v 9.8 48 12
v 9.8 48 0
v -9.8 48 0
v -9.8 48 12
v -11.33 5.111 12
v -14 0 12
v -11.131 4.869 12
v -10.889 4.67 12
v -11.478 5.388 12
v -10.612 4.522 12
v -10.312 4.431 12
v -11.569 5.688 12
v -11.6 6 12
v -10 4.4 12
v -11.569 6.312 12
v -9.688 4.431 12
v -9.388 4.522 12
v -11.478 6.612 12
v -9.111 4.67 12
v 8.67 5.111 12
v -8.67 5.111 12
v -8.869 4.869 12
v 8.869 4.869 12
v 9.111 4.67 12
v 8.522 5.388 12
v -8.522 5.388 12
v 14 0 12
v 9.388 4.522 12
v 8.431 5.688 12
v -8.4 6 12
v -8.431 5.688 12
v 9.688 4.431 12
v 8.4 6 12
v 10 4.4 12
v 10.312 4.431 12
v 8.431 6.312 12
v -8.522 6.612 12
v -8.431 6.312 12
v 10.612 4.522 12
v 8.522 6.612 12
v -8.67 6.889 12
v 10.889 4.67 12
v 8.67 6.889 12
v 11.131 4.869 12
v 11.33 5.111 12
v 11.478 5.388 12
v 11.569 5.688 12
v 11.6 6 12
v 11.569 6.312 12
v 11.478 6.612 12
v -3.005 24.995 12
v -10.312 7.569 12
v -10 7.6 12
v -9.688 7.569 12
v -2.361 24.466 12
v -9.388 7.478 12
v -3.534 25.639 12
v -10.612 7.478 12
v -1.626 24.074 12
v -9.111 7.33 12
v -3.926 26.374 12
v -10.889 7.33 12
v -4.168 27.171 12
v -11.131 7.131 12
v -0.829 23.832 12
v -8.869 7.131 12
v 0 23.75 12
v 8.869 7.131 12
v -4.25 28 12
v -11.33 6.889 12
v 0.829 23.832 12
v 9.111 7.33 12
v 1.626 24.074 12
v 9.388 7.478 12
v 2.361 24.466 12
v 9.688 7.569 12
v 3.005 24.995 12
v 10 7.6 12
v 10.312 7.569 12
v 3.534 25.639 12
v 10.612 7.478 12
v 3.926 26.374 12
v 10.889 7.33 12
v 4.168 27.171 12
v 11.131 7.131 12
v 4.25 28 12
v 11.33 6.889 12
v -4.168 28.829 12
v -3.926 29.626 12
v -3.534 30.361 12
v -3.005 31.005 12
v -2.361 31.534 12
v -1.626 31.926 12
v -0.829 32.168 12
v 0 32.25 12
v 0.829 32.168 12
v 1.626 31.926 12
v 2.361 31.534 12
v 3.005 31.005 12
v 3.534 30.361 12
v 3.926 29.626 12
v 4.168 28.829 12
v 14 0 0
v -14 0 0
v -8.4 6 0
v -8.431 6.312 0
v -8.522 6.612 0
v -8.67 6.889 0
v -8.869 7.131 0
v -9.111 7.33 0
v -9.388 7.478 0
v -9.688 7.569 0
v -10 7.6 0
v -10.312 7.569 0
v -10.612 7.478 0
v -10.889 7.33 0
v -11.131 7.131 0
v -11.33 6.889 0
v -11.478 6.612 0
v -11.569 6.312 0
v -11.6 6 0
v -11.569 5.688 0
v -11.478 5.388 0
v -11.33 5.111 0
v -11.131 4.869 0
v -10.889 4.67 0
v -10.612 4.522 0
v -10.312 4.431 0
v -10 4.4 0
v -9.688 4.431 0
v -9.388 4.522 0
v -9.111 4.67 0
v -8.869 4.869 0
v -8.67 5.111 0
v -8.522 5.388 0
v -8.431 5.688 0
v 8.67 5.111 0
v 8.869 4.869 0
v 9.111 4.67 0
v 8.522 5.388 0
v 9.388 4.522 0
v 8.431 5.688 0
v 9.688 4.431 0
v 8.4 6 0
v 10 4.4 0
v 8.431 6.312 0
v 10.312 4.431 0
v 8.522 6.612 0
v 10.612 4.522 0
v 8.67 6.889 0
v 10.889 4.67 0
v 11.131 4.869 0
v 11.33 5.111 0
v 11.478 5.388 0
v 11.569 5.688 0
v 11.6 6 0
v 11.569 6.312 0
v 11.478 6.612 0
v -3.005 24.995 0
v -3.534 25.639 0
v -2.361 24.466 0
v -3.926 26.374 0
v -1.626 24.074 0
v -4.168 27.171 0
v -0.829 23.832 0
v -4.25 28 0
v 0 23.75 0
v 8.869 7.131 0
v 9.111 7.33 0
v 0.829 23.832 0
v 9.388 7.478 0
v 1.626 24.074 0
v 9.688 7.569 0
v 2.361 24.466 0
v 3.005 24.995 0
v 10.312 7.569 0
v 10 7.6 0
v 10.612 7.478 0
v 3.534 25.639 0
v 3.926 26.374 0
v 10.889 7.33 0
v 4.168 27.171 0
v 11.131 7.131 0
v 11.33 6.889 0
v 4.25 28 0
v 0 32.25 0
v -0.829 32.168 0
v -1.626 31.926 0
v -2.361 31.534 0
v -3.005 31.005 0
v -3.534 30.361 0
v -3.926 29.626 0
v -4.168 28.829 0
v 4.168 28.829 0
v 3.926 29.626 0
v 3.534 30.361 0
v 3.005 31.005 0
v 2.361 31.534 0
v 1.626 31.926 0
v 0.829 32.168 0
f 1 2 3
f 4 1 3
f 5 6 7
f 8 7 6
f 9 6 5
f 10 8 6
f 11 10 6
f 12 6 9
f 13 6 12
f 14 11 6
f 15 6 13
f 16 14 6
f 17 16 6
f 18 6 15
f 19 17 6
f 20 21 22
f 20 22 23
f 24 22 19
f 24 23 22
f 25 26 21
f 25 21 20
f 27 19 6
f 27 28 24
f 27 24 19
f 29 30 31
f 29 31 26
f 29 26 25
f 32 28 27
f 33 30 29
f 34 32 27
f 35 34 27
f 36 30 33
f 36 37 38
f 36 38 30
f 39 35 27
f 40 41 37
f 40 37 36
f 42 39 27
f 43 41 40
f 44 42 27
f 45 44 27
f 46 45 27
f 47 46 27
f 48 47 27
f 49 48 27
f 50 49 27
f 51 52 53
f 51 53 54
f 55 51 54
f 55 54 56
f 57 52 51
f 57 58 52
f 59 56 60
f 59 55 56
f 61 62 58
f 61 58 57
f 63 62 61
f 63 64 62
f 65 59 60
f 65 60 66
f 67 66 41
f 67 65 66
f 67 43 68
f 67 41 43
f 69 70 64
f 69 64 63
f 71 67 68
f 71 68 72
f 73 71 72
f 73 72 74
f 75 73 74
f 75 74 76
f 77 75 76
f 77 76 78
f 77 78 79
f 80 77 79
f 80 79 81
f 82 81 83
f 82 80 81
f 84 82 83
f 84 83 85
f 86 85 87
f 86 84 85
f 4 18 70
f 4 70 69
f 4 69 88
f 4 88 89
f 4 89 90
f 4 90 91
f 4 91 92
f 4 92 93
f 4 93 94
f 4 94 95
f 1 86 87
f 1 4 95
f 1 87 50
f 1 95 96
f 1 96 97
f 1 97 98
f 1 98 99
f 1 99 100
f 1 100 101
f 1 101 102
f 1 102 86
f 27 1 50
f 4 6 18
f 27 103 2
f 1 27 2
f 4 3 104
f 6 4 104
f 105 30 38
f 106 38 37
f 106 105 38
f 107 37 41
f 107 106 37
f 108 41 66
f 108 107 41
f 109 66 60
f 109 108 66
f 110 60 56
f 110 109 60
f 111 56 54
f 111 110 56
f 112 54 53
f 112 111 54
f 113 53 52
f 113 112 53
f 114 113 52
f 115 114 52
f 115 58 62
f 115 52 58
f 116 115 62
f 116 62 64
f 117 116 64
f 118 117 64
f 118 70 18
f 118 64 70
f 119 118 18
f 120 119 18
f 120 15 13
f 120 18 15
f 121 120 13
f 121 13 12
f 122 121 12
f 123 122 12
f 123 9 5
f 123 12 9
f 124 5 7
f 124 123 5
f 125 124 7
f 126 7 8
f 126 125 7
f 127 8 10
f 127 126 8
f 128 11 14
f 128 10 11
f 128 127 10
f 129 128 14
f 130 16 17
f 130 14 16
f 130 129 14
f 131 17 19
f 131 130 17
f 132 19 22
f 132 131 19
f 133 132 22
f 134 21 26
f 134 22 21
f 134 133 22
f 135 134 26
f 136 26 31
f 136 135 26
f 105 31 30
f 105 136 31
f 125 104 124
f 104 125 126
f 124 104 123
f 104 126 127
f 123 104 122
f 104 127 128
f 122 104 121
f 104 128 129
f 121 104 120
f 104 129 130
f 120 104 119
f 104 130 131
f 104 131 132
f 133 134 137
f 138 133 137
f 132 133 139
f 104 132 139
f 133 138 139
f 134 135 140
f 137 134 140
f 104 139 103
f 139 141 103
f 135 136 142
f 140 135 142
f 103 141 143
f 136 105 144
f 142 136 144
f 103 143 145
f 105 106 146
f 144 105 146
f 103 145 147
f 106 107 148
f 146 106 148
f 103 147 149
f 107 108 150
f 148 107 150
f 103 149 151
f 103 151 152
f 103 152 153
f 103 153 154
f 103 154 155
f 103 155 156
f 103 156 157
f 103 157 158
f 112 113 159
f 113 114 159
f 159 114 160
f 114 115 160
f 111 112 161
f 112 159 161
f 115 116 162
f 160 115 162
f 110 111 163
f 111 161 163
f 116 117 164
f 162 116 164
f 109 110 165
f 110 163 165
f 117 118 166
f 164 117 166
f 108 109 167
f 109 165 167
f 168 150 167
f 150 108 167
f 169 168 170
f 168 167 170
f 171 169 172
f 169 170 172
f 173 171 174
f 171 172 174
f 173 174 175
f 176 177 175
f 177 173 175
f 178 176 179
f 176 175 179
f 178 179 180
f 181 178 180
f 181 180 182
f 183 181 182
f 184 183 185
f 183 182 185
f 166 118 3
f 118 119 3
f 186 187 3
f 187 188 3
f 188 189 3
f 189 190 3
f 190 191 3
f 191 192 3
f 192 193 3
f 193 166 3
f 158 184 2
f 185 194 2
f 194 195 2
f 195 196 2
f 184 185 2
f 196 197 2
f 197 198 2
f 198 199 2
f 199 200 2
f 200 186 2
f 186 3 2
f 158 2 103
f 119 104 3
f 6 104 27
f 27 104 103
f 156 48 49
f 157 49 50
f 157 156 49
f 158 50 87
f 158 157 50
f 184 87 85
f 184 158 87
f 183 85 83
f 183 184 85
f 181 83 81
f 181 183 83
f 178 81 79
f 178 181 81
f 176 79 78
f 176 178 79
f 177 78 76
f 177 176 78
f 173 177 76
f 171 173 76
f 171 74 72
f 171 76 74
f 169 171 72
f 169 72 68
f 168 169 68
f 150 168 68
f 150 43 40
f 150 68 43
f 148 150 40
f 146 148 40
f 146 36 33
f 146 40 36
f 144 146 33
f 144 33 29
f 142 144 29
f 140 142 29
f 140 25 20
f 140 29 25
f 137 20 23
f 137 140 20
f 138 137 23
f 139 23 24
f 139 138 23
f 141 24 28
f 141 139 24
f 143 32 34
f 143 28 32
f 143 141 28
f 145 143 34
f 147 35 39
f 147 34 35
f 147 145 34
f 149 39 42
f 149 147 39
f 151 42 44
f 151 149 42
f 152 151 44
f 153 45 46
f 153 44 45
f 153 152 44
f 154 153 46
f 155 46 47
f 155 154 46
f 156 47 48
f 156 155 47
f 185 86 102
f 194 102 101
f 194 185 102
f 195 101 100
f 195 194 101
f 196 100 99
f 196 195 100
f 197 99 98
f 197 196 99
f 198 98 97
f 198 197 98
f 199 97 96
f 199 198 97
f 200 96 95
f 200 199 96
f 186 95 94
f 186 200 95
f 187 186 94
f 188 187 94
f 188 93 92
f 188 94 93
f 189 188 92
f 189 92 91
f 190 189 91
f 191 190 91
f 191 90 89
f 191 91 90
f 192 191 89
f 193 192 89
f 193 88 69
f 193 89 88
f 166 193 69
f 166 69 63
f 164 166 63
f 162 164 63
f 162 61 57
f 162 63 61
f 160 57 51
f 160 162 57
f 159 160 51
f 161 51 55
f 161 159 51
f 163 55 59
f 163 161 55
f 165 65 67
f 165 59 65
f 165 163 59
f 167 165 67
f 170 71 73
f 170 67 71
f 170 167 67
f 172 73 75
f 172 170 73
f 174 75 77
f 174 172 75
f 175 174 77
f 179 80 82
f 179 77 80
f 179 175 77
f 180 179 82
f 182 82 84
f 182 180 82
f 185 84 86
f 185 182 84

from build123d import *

# Parameters (mm, degrees)
BOSS_EXTRUDE1_DEPTH = 12
SKETCH2_R           = 4.25
SKETCH2_R_2         = 1.6
CUT_EXTRUDE2_DEPTH  = 13


with BuildPart() as part:
    # Sketch1 → Boss-Extrude1 (new body)
    with BuildSketch(Plane.XY):
        Polygon((-14, 0), (14, 0), (9.8, 48), (-9.8, 48), align=None)
    extrude(amount=BOSS_EXTRUDE1_DEPTH)

    # Sketch2 → Cut-Extrude2 (cut)
    with BuildSketch(Plane.XY):
        with Locations((0, 28)):
            Circle(SKETCH2_R)
        with Locations((10, 6)):
            Circle(SKETCH2_R_2)
        with Locations((-10, 6)):
            Circle(SKETCH2_R_2)
    extrude(amount=CUT_EXTRUDE2_DEPTH, mode=Mode.SUBTRACT)


solid = part.part
